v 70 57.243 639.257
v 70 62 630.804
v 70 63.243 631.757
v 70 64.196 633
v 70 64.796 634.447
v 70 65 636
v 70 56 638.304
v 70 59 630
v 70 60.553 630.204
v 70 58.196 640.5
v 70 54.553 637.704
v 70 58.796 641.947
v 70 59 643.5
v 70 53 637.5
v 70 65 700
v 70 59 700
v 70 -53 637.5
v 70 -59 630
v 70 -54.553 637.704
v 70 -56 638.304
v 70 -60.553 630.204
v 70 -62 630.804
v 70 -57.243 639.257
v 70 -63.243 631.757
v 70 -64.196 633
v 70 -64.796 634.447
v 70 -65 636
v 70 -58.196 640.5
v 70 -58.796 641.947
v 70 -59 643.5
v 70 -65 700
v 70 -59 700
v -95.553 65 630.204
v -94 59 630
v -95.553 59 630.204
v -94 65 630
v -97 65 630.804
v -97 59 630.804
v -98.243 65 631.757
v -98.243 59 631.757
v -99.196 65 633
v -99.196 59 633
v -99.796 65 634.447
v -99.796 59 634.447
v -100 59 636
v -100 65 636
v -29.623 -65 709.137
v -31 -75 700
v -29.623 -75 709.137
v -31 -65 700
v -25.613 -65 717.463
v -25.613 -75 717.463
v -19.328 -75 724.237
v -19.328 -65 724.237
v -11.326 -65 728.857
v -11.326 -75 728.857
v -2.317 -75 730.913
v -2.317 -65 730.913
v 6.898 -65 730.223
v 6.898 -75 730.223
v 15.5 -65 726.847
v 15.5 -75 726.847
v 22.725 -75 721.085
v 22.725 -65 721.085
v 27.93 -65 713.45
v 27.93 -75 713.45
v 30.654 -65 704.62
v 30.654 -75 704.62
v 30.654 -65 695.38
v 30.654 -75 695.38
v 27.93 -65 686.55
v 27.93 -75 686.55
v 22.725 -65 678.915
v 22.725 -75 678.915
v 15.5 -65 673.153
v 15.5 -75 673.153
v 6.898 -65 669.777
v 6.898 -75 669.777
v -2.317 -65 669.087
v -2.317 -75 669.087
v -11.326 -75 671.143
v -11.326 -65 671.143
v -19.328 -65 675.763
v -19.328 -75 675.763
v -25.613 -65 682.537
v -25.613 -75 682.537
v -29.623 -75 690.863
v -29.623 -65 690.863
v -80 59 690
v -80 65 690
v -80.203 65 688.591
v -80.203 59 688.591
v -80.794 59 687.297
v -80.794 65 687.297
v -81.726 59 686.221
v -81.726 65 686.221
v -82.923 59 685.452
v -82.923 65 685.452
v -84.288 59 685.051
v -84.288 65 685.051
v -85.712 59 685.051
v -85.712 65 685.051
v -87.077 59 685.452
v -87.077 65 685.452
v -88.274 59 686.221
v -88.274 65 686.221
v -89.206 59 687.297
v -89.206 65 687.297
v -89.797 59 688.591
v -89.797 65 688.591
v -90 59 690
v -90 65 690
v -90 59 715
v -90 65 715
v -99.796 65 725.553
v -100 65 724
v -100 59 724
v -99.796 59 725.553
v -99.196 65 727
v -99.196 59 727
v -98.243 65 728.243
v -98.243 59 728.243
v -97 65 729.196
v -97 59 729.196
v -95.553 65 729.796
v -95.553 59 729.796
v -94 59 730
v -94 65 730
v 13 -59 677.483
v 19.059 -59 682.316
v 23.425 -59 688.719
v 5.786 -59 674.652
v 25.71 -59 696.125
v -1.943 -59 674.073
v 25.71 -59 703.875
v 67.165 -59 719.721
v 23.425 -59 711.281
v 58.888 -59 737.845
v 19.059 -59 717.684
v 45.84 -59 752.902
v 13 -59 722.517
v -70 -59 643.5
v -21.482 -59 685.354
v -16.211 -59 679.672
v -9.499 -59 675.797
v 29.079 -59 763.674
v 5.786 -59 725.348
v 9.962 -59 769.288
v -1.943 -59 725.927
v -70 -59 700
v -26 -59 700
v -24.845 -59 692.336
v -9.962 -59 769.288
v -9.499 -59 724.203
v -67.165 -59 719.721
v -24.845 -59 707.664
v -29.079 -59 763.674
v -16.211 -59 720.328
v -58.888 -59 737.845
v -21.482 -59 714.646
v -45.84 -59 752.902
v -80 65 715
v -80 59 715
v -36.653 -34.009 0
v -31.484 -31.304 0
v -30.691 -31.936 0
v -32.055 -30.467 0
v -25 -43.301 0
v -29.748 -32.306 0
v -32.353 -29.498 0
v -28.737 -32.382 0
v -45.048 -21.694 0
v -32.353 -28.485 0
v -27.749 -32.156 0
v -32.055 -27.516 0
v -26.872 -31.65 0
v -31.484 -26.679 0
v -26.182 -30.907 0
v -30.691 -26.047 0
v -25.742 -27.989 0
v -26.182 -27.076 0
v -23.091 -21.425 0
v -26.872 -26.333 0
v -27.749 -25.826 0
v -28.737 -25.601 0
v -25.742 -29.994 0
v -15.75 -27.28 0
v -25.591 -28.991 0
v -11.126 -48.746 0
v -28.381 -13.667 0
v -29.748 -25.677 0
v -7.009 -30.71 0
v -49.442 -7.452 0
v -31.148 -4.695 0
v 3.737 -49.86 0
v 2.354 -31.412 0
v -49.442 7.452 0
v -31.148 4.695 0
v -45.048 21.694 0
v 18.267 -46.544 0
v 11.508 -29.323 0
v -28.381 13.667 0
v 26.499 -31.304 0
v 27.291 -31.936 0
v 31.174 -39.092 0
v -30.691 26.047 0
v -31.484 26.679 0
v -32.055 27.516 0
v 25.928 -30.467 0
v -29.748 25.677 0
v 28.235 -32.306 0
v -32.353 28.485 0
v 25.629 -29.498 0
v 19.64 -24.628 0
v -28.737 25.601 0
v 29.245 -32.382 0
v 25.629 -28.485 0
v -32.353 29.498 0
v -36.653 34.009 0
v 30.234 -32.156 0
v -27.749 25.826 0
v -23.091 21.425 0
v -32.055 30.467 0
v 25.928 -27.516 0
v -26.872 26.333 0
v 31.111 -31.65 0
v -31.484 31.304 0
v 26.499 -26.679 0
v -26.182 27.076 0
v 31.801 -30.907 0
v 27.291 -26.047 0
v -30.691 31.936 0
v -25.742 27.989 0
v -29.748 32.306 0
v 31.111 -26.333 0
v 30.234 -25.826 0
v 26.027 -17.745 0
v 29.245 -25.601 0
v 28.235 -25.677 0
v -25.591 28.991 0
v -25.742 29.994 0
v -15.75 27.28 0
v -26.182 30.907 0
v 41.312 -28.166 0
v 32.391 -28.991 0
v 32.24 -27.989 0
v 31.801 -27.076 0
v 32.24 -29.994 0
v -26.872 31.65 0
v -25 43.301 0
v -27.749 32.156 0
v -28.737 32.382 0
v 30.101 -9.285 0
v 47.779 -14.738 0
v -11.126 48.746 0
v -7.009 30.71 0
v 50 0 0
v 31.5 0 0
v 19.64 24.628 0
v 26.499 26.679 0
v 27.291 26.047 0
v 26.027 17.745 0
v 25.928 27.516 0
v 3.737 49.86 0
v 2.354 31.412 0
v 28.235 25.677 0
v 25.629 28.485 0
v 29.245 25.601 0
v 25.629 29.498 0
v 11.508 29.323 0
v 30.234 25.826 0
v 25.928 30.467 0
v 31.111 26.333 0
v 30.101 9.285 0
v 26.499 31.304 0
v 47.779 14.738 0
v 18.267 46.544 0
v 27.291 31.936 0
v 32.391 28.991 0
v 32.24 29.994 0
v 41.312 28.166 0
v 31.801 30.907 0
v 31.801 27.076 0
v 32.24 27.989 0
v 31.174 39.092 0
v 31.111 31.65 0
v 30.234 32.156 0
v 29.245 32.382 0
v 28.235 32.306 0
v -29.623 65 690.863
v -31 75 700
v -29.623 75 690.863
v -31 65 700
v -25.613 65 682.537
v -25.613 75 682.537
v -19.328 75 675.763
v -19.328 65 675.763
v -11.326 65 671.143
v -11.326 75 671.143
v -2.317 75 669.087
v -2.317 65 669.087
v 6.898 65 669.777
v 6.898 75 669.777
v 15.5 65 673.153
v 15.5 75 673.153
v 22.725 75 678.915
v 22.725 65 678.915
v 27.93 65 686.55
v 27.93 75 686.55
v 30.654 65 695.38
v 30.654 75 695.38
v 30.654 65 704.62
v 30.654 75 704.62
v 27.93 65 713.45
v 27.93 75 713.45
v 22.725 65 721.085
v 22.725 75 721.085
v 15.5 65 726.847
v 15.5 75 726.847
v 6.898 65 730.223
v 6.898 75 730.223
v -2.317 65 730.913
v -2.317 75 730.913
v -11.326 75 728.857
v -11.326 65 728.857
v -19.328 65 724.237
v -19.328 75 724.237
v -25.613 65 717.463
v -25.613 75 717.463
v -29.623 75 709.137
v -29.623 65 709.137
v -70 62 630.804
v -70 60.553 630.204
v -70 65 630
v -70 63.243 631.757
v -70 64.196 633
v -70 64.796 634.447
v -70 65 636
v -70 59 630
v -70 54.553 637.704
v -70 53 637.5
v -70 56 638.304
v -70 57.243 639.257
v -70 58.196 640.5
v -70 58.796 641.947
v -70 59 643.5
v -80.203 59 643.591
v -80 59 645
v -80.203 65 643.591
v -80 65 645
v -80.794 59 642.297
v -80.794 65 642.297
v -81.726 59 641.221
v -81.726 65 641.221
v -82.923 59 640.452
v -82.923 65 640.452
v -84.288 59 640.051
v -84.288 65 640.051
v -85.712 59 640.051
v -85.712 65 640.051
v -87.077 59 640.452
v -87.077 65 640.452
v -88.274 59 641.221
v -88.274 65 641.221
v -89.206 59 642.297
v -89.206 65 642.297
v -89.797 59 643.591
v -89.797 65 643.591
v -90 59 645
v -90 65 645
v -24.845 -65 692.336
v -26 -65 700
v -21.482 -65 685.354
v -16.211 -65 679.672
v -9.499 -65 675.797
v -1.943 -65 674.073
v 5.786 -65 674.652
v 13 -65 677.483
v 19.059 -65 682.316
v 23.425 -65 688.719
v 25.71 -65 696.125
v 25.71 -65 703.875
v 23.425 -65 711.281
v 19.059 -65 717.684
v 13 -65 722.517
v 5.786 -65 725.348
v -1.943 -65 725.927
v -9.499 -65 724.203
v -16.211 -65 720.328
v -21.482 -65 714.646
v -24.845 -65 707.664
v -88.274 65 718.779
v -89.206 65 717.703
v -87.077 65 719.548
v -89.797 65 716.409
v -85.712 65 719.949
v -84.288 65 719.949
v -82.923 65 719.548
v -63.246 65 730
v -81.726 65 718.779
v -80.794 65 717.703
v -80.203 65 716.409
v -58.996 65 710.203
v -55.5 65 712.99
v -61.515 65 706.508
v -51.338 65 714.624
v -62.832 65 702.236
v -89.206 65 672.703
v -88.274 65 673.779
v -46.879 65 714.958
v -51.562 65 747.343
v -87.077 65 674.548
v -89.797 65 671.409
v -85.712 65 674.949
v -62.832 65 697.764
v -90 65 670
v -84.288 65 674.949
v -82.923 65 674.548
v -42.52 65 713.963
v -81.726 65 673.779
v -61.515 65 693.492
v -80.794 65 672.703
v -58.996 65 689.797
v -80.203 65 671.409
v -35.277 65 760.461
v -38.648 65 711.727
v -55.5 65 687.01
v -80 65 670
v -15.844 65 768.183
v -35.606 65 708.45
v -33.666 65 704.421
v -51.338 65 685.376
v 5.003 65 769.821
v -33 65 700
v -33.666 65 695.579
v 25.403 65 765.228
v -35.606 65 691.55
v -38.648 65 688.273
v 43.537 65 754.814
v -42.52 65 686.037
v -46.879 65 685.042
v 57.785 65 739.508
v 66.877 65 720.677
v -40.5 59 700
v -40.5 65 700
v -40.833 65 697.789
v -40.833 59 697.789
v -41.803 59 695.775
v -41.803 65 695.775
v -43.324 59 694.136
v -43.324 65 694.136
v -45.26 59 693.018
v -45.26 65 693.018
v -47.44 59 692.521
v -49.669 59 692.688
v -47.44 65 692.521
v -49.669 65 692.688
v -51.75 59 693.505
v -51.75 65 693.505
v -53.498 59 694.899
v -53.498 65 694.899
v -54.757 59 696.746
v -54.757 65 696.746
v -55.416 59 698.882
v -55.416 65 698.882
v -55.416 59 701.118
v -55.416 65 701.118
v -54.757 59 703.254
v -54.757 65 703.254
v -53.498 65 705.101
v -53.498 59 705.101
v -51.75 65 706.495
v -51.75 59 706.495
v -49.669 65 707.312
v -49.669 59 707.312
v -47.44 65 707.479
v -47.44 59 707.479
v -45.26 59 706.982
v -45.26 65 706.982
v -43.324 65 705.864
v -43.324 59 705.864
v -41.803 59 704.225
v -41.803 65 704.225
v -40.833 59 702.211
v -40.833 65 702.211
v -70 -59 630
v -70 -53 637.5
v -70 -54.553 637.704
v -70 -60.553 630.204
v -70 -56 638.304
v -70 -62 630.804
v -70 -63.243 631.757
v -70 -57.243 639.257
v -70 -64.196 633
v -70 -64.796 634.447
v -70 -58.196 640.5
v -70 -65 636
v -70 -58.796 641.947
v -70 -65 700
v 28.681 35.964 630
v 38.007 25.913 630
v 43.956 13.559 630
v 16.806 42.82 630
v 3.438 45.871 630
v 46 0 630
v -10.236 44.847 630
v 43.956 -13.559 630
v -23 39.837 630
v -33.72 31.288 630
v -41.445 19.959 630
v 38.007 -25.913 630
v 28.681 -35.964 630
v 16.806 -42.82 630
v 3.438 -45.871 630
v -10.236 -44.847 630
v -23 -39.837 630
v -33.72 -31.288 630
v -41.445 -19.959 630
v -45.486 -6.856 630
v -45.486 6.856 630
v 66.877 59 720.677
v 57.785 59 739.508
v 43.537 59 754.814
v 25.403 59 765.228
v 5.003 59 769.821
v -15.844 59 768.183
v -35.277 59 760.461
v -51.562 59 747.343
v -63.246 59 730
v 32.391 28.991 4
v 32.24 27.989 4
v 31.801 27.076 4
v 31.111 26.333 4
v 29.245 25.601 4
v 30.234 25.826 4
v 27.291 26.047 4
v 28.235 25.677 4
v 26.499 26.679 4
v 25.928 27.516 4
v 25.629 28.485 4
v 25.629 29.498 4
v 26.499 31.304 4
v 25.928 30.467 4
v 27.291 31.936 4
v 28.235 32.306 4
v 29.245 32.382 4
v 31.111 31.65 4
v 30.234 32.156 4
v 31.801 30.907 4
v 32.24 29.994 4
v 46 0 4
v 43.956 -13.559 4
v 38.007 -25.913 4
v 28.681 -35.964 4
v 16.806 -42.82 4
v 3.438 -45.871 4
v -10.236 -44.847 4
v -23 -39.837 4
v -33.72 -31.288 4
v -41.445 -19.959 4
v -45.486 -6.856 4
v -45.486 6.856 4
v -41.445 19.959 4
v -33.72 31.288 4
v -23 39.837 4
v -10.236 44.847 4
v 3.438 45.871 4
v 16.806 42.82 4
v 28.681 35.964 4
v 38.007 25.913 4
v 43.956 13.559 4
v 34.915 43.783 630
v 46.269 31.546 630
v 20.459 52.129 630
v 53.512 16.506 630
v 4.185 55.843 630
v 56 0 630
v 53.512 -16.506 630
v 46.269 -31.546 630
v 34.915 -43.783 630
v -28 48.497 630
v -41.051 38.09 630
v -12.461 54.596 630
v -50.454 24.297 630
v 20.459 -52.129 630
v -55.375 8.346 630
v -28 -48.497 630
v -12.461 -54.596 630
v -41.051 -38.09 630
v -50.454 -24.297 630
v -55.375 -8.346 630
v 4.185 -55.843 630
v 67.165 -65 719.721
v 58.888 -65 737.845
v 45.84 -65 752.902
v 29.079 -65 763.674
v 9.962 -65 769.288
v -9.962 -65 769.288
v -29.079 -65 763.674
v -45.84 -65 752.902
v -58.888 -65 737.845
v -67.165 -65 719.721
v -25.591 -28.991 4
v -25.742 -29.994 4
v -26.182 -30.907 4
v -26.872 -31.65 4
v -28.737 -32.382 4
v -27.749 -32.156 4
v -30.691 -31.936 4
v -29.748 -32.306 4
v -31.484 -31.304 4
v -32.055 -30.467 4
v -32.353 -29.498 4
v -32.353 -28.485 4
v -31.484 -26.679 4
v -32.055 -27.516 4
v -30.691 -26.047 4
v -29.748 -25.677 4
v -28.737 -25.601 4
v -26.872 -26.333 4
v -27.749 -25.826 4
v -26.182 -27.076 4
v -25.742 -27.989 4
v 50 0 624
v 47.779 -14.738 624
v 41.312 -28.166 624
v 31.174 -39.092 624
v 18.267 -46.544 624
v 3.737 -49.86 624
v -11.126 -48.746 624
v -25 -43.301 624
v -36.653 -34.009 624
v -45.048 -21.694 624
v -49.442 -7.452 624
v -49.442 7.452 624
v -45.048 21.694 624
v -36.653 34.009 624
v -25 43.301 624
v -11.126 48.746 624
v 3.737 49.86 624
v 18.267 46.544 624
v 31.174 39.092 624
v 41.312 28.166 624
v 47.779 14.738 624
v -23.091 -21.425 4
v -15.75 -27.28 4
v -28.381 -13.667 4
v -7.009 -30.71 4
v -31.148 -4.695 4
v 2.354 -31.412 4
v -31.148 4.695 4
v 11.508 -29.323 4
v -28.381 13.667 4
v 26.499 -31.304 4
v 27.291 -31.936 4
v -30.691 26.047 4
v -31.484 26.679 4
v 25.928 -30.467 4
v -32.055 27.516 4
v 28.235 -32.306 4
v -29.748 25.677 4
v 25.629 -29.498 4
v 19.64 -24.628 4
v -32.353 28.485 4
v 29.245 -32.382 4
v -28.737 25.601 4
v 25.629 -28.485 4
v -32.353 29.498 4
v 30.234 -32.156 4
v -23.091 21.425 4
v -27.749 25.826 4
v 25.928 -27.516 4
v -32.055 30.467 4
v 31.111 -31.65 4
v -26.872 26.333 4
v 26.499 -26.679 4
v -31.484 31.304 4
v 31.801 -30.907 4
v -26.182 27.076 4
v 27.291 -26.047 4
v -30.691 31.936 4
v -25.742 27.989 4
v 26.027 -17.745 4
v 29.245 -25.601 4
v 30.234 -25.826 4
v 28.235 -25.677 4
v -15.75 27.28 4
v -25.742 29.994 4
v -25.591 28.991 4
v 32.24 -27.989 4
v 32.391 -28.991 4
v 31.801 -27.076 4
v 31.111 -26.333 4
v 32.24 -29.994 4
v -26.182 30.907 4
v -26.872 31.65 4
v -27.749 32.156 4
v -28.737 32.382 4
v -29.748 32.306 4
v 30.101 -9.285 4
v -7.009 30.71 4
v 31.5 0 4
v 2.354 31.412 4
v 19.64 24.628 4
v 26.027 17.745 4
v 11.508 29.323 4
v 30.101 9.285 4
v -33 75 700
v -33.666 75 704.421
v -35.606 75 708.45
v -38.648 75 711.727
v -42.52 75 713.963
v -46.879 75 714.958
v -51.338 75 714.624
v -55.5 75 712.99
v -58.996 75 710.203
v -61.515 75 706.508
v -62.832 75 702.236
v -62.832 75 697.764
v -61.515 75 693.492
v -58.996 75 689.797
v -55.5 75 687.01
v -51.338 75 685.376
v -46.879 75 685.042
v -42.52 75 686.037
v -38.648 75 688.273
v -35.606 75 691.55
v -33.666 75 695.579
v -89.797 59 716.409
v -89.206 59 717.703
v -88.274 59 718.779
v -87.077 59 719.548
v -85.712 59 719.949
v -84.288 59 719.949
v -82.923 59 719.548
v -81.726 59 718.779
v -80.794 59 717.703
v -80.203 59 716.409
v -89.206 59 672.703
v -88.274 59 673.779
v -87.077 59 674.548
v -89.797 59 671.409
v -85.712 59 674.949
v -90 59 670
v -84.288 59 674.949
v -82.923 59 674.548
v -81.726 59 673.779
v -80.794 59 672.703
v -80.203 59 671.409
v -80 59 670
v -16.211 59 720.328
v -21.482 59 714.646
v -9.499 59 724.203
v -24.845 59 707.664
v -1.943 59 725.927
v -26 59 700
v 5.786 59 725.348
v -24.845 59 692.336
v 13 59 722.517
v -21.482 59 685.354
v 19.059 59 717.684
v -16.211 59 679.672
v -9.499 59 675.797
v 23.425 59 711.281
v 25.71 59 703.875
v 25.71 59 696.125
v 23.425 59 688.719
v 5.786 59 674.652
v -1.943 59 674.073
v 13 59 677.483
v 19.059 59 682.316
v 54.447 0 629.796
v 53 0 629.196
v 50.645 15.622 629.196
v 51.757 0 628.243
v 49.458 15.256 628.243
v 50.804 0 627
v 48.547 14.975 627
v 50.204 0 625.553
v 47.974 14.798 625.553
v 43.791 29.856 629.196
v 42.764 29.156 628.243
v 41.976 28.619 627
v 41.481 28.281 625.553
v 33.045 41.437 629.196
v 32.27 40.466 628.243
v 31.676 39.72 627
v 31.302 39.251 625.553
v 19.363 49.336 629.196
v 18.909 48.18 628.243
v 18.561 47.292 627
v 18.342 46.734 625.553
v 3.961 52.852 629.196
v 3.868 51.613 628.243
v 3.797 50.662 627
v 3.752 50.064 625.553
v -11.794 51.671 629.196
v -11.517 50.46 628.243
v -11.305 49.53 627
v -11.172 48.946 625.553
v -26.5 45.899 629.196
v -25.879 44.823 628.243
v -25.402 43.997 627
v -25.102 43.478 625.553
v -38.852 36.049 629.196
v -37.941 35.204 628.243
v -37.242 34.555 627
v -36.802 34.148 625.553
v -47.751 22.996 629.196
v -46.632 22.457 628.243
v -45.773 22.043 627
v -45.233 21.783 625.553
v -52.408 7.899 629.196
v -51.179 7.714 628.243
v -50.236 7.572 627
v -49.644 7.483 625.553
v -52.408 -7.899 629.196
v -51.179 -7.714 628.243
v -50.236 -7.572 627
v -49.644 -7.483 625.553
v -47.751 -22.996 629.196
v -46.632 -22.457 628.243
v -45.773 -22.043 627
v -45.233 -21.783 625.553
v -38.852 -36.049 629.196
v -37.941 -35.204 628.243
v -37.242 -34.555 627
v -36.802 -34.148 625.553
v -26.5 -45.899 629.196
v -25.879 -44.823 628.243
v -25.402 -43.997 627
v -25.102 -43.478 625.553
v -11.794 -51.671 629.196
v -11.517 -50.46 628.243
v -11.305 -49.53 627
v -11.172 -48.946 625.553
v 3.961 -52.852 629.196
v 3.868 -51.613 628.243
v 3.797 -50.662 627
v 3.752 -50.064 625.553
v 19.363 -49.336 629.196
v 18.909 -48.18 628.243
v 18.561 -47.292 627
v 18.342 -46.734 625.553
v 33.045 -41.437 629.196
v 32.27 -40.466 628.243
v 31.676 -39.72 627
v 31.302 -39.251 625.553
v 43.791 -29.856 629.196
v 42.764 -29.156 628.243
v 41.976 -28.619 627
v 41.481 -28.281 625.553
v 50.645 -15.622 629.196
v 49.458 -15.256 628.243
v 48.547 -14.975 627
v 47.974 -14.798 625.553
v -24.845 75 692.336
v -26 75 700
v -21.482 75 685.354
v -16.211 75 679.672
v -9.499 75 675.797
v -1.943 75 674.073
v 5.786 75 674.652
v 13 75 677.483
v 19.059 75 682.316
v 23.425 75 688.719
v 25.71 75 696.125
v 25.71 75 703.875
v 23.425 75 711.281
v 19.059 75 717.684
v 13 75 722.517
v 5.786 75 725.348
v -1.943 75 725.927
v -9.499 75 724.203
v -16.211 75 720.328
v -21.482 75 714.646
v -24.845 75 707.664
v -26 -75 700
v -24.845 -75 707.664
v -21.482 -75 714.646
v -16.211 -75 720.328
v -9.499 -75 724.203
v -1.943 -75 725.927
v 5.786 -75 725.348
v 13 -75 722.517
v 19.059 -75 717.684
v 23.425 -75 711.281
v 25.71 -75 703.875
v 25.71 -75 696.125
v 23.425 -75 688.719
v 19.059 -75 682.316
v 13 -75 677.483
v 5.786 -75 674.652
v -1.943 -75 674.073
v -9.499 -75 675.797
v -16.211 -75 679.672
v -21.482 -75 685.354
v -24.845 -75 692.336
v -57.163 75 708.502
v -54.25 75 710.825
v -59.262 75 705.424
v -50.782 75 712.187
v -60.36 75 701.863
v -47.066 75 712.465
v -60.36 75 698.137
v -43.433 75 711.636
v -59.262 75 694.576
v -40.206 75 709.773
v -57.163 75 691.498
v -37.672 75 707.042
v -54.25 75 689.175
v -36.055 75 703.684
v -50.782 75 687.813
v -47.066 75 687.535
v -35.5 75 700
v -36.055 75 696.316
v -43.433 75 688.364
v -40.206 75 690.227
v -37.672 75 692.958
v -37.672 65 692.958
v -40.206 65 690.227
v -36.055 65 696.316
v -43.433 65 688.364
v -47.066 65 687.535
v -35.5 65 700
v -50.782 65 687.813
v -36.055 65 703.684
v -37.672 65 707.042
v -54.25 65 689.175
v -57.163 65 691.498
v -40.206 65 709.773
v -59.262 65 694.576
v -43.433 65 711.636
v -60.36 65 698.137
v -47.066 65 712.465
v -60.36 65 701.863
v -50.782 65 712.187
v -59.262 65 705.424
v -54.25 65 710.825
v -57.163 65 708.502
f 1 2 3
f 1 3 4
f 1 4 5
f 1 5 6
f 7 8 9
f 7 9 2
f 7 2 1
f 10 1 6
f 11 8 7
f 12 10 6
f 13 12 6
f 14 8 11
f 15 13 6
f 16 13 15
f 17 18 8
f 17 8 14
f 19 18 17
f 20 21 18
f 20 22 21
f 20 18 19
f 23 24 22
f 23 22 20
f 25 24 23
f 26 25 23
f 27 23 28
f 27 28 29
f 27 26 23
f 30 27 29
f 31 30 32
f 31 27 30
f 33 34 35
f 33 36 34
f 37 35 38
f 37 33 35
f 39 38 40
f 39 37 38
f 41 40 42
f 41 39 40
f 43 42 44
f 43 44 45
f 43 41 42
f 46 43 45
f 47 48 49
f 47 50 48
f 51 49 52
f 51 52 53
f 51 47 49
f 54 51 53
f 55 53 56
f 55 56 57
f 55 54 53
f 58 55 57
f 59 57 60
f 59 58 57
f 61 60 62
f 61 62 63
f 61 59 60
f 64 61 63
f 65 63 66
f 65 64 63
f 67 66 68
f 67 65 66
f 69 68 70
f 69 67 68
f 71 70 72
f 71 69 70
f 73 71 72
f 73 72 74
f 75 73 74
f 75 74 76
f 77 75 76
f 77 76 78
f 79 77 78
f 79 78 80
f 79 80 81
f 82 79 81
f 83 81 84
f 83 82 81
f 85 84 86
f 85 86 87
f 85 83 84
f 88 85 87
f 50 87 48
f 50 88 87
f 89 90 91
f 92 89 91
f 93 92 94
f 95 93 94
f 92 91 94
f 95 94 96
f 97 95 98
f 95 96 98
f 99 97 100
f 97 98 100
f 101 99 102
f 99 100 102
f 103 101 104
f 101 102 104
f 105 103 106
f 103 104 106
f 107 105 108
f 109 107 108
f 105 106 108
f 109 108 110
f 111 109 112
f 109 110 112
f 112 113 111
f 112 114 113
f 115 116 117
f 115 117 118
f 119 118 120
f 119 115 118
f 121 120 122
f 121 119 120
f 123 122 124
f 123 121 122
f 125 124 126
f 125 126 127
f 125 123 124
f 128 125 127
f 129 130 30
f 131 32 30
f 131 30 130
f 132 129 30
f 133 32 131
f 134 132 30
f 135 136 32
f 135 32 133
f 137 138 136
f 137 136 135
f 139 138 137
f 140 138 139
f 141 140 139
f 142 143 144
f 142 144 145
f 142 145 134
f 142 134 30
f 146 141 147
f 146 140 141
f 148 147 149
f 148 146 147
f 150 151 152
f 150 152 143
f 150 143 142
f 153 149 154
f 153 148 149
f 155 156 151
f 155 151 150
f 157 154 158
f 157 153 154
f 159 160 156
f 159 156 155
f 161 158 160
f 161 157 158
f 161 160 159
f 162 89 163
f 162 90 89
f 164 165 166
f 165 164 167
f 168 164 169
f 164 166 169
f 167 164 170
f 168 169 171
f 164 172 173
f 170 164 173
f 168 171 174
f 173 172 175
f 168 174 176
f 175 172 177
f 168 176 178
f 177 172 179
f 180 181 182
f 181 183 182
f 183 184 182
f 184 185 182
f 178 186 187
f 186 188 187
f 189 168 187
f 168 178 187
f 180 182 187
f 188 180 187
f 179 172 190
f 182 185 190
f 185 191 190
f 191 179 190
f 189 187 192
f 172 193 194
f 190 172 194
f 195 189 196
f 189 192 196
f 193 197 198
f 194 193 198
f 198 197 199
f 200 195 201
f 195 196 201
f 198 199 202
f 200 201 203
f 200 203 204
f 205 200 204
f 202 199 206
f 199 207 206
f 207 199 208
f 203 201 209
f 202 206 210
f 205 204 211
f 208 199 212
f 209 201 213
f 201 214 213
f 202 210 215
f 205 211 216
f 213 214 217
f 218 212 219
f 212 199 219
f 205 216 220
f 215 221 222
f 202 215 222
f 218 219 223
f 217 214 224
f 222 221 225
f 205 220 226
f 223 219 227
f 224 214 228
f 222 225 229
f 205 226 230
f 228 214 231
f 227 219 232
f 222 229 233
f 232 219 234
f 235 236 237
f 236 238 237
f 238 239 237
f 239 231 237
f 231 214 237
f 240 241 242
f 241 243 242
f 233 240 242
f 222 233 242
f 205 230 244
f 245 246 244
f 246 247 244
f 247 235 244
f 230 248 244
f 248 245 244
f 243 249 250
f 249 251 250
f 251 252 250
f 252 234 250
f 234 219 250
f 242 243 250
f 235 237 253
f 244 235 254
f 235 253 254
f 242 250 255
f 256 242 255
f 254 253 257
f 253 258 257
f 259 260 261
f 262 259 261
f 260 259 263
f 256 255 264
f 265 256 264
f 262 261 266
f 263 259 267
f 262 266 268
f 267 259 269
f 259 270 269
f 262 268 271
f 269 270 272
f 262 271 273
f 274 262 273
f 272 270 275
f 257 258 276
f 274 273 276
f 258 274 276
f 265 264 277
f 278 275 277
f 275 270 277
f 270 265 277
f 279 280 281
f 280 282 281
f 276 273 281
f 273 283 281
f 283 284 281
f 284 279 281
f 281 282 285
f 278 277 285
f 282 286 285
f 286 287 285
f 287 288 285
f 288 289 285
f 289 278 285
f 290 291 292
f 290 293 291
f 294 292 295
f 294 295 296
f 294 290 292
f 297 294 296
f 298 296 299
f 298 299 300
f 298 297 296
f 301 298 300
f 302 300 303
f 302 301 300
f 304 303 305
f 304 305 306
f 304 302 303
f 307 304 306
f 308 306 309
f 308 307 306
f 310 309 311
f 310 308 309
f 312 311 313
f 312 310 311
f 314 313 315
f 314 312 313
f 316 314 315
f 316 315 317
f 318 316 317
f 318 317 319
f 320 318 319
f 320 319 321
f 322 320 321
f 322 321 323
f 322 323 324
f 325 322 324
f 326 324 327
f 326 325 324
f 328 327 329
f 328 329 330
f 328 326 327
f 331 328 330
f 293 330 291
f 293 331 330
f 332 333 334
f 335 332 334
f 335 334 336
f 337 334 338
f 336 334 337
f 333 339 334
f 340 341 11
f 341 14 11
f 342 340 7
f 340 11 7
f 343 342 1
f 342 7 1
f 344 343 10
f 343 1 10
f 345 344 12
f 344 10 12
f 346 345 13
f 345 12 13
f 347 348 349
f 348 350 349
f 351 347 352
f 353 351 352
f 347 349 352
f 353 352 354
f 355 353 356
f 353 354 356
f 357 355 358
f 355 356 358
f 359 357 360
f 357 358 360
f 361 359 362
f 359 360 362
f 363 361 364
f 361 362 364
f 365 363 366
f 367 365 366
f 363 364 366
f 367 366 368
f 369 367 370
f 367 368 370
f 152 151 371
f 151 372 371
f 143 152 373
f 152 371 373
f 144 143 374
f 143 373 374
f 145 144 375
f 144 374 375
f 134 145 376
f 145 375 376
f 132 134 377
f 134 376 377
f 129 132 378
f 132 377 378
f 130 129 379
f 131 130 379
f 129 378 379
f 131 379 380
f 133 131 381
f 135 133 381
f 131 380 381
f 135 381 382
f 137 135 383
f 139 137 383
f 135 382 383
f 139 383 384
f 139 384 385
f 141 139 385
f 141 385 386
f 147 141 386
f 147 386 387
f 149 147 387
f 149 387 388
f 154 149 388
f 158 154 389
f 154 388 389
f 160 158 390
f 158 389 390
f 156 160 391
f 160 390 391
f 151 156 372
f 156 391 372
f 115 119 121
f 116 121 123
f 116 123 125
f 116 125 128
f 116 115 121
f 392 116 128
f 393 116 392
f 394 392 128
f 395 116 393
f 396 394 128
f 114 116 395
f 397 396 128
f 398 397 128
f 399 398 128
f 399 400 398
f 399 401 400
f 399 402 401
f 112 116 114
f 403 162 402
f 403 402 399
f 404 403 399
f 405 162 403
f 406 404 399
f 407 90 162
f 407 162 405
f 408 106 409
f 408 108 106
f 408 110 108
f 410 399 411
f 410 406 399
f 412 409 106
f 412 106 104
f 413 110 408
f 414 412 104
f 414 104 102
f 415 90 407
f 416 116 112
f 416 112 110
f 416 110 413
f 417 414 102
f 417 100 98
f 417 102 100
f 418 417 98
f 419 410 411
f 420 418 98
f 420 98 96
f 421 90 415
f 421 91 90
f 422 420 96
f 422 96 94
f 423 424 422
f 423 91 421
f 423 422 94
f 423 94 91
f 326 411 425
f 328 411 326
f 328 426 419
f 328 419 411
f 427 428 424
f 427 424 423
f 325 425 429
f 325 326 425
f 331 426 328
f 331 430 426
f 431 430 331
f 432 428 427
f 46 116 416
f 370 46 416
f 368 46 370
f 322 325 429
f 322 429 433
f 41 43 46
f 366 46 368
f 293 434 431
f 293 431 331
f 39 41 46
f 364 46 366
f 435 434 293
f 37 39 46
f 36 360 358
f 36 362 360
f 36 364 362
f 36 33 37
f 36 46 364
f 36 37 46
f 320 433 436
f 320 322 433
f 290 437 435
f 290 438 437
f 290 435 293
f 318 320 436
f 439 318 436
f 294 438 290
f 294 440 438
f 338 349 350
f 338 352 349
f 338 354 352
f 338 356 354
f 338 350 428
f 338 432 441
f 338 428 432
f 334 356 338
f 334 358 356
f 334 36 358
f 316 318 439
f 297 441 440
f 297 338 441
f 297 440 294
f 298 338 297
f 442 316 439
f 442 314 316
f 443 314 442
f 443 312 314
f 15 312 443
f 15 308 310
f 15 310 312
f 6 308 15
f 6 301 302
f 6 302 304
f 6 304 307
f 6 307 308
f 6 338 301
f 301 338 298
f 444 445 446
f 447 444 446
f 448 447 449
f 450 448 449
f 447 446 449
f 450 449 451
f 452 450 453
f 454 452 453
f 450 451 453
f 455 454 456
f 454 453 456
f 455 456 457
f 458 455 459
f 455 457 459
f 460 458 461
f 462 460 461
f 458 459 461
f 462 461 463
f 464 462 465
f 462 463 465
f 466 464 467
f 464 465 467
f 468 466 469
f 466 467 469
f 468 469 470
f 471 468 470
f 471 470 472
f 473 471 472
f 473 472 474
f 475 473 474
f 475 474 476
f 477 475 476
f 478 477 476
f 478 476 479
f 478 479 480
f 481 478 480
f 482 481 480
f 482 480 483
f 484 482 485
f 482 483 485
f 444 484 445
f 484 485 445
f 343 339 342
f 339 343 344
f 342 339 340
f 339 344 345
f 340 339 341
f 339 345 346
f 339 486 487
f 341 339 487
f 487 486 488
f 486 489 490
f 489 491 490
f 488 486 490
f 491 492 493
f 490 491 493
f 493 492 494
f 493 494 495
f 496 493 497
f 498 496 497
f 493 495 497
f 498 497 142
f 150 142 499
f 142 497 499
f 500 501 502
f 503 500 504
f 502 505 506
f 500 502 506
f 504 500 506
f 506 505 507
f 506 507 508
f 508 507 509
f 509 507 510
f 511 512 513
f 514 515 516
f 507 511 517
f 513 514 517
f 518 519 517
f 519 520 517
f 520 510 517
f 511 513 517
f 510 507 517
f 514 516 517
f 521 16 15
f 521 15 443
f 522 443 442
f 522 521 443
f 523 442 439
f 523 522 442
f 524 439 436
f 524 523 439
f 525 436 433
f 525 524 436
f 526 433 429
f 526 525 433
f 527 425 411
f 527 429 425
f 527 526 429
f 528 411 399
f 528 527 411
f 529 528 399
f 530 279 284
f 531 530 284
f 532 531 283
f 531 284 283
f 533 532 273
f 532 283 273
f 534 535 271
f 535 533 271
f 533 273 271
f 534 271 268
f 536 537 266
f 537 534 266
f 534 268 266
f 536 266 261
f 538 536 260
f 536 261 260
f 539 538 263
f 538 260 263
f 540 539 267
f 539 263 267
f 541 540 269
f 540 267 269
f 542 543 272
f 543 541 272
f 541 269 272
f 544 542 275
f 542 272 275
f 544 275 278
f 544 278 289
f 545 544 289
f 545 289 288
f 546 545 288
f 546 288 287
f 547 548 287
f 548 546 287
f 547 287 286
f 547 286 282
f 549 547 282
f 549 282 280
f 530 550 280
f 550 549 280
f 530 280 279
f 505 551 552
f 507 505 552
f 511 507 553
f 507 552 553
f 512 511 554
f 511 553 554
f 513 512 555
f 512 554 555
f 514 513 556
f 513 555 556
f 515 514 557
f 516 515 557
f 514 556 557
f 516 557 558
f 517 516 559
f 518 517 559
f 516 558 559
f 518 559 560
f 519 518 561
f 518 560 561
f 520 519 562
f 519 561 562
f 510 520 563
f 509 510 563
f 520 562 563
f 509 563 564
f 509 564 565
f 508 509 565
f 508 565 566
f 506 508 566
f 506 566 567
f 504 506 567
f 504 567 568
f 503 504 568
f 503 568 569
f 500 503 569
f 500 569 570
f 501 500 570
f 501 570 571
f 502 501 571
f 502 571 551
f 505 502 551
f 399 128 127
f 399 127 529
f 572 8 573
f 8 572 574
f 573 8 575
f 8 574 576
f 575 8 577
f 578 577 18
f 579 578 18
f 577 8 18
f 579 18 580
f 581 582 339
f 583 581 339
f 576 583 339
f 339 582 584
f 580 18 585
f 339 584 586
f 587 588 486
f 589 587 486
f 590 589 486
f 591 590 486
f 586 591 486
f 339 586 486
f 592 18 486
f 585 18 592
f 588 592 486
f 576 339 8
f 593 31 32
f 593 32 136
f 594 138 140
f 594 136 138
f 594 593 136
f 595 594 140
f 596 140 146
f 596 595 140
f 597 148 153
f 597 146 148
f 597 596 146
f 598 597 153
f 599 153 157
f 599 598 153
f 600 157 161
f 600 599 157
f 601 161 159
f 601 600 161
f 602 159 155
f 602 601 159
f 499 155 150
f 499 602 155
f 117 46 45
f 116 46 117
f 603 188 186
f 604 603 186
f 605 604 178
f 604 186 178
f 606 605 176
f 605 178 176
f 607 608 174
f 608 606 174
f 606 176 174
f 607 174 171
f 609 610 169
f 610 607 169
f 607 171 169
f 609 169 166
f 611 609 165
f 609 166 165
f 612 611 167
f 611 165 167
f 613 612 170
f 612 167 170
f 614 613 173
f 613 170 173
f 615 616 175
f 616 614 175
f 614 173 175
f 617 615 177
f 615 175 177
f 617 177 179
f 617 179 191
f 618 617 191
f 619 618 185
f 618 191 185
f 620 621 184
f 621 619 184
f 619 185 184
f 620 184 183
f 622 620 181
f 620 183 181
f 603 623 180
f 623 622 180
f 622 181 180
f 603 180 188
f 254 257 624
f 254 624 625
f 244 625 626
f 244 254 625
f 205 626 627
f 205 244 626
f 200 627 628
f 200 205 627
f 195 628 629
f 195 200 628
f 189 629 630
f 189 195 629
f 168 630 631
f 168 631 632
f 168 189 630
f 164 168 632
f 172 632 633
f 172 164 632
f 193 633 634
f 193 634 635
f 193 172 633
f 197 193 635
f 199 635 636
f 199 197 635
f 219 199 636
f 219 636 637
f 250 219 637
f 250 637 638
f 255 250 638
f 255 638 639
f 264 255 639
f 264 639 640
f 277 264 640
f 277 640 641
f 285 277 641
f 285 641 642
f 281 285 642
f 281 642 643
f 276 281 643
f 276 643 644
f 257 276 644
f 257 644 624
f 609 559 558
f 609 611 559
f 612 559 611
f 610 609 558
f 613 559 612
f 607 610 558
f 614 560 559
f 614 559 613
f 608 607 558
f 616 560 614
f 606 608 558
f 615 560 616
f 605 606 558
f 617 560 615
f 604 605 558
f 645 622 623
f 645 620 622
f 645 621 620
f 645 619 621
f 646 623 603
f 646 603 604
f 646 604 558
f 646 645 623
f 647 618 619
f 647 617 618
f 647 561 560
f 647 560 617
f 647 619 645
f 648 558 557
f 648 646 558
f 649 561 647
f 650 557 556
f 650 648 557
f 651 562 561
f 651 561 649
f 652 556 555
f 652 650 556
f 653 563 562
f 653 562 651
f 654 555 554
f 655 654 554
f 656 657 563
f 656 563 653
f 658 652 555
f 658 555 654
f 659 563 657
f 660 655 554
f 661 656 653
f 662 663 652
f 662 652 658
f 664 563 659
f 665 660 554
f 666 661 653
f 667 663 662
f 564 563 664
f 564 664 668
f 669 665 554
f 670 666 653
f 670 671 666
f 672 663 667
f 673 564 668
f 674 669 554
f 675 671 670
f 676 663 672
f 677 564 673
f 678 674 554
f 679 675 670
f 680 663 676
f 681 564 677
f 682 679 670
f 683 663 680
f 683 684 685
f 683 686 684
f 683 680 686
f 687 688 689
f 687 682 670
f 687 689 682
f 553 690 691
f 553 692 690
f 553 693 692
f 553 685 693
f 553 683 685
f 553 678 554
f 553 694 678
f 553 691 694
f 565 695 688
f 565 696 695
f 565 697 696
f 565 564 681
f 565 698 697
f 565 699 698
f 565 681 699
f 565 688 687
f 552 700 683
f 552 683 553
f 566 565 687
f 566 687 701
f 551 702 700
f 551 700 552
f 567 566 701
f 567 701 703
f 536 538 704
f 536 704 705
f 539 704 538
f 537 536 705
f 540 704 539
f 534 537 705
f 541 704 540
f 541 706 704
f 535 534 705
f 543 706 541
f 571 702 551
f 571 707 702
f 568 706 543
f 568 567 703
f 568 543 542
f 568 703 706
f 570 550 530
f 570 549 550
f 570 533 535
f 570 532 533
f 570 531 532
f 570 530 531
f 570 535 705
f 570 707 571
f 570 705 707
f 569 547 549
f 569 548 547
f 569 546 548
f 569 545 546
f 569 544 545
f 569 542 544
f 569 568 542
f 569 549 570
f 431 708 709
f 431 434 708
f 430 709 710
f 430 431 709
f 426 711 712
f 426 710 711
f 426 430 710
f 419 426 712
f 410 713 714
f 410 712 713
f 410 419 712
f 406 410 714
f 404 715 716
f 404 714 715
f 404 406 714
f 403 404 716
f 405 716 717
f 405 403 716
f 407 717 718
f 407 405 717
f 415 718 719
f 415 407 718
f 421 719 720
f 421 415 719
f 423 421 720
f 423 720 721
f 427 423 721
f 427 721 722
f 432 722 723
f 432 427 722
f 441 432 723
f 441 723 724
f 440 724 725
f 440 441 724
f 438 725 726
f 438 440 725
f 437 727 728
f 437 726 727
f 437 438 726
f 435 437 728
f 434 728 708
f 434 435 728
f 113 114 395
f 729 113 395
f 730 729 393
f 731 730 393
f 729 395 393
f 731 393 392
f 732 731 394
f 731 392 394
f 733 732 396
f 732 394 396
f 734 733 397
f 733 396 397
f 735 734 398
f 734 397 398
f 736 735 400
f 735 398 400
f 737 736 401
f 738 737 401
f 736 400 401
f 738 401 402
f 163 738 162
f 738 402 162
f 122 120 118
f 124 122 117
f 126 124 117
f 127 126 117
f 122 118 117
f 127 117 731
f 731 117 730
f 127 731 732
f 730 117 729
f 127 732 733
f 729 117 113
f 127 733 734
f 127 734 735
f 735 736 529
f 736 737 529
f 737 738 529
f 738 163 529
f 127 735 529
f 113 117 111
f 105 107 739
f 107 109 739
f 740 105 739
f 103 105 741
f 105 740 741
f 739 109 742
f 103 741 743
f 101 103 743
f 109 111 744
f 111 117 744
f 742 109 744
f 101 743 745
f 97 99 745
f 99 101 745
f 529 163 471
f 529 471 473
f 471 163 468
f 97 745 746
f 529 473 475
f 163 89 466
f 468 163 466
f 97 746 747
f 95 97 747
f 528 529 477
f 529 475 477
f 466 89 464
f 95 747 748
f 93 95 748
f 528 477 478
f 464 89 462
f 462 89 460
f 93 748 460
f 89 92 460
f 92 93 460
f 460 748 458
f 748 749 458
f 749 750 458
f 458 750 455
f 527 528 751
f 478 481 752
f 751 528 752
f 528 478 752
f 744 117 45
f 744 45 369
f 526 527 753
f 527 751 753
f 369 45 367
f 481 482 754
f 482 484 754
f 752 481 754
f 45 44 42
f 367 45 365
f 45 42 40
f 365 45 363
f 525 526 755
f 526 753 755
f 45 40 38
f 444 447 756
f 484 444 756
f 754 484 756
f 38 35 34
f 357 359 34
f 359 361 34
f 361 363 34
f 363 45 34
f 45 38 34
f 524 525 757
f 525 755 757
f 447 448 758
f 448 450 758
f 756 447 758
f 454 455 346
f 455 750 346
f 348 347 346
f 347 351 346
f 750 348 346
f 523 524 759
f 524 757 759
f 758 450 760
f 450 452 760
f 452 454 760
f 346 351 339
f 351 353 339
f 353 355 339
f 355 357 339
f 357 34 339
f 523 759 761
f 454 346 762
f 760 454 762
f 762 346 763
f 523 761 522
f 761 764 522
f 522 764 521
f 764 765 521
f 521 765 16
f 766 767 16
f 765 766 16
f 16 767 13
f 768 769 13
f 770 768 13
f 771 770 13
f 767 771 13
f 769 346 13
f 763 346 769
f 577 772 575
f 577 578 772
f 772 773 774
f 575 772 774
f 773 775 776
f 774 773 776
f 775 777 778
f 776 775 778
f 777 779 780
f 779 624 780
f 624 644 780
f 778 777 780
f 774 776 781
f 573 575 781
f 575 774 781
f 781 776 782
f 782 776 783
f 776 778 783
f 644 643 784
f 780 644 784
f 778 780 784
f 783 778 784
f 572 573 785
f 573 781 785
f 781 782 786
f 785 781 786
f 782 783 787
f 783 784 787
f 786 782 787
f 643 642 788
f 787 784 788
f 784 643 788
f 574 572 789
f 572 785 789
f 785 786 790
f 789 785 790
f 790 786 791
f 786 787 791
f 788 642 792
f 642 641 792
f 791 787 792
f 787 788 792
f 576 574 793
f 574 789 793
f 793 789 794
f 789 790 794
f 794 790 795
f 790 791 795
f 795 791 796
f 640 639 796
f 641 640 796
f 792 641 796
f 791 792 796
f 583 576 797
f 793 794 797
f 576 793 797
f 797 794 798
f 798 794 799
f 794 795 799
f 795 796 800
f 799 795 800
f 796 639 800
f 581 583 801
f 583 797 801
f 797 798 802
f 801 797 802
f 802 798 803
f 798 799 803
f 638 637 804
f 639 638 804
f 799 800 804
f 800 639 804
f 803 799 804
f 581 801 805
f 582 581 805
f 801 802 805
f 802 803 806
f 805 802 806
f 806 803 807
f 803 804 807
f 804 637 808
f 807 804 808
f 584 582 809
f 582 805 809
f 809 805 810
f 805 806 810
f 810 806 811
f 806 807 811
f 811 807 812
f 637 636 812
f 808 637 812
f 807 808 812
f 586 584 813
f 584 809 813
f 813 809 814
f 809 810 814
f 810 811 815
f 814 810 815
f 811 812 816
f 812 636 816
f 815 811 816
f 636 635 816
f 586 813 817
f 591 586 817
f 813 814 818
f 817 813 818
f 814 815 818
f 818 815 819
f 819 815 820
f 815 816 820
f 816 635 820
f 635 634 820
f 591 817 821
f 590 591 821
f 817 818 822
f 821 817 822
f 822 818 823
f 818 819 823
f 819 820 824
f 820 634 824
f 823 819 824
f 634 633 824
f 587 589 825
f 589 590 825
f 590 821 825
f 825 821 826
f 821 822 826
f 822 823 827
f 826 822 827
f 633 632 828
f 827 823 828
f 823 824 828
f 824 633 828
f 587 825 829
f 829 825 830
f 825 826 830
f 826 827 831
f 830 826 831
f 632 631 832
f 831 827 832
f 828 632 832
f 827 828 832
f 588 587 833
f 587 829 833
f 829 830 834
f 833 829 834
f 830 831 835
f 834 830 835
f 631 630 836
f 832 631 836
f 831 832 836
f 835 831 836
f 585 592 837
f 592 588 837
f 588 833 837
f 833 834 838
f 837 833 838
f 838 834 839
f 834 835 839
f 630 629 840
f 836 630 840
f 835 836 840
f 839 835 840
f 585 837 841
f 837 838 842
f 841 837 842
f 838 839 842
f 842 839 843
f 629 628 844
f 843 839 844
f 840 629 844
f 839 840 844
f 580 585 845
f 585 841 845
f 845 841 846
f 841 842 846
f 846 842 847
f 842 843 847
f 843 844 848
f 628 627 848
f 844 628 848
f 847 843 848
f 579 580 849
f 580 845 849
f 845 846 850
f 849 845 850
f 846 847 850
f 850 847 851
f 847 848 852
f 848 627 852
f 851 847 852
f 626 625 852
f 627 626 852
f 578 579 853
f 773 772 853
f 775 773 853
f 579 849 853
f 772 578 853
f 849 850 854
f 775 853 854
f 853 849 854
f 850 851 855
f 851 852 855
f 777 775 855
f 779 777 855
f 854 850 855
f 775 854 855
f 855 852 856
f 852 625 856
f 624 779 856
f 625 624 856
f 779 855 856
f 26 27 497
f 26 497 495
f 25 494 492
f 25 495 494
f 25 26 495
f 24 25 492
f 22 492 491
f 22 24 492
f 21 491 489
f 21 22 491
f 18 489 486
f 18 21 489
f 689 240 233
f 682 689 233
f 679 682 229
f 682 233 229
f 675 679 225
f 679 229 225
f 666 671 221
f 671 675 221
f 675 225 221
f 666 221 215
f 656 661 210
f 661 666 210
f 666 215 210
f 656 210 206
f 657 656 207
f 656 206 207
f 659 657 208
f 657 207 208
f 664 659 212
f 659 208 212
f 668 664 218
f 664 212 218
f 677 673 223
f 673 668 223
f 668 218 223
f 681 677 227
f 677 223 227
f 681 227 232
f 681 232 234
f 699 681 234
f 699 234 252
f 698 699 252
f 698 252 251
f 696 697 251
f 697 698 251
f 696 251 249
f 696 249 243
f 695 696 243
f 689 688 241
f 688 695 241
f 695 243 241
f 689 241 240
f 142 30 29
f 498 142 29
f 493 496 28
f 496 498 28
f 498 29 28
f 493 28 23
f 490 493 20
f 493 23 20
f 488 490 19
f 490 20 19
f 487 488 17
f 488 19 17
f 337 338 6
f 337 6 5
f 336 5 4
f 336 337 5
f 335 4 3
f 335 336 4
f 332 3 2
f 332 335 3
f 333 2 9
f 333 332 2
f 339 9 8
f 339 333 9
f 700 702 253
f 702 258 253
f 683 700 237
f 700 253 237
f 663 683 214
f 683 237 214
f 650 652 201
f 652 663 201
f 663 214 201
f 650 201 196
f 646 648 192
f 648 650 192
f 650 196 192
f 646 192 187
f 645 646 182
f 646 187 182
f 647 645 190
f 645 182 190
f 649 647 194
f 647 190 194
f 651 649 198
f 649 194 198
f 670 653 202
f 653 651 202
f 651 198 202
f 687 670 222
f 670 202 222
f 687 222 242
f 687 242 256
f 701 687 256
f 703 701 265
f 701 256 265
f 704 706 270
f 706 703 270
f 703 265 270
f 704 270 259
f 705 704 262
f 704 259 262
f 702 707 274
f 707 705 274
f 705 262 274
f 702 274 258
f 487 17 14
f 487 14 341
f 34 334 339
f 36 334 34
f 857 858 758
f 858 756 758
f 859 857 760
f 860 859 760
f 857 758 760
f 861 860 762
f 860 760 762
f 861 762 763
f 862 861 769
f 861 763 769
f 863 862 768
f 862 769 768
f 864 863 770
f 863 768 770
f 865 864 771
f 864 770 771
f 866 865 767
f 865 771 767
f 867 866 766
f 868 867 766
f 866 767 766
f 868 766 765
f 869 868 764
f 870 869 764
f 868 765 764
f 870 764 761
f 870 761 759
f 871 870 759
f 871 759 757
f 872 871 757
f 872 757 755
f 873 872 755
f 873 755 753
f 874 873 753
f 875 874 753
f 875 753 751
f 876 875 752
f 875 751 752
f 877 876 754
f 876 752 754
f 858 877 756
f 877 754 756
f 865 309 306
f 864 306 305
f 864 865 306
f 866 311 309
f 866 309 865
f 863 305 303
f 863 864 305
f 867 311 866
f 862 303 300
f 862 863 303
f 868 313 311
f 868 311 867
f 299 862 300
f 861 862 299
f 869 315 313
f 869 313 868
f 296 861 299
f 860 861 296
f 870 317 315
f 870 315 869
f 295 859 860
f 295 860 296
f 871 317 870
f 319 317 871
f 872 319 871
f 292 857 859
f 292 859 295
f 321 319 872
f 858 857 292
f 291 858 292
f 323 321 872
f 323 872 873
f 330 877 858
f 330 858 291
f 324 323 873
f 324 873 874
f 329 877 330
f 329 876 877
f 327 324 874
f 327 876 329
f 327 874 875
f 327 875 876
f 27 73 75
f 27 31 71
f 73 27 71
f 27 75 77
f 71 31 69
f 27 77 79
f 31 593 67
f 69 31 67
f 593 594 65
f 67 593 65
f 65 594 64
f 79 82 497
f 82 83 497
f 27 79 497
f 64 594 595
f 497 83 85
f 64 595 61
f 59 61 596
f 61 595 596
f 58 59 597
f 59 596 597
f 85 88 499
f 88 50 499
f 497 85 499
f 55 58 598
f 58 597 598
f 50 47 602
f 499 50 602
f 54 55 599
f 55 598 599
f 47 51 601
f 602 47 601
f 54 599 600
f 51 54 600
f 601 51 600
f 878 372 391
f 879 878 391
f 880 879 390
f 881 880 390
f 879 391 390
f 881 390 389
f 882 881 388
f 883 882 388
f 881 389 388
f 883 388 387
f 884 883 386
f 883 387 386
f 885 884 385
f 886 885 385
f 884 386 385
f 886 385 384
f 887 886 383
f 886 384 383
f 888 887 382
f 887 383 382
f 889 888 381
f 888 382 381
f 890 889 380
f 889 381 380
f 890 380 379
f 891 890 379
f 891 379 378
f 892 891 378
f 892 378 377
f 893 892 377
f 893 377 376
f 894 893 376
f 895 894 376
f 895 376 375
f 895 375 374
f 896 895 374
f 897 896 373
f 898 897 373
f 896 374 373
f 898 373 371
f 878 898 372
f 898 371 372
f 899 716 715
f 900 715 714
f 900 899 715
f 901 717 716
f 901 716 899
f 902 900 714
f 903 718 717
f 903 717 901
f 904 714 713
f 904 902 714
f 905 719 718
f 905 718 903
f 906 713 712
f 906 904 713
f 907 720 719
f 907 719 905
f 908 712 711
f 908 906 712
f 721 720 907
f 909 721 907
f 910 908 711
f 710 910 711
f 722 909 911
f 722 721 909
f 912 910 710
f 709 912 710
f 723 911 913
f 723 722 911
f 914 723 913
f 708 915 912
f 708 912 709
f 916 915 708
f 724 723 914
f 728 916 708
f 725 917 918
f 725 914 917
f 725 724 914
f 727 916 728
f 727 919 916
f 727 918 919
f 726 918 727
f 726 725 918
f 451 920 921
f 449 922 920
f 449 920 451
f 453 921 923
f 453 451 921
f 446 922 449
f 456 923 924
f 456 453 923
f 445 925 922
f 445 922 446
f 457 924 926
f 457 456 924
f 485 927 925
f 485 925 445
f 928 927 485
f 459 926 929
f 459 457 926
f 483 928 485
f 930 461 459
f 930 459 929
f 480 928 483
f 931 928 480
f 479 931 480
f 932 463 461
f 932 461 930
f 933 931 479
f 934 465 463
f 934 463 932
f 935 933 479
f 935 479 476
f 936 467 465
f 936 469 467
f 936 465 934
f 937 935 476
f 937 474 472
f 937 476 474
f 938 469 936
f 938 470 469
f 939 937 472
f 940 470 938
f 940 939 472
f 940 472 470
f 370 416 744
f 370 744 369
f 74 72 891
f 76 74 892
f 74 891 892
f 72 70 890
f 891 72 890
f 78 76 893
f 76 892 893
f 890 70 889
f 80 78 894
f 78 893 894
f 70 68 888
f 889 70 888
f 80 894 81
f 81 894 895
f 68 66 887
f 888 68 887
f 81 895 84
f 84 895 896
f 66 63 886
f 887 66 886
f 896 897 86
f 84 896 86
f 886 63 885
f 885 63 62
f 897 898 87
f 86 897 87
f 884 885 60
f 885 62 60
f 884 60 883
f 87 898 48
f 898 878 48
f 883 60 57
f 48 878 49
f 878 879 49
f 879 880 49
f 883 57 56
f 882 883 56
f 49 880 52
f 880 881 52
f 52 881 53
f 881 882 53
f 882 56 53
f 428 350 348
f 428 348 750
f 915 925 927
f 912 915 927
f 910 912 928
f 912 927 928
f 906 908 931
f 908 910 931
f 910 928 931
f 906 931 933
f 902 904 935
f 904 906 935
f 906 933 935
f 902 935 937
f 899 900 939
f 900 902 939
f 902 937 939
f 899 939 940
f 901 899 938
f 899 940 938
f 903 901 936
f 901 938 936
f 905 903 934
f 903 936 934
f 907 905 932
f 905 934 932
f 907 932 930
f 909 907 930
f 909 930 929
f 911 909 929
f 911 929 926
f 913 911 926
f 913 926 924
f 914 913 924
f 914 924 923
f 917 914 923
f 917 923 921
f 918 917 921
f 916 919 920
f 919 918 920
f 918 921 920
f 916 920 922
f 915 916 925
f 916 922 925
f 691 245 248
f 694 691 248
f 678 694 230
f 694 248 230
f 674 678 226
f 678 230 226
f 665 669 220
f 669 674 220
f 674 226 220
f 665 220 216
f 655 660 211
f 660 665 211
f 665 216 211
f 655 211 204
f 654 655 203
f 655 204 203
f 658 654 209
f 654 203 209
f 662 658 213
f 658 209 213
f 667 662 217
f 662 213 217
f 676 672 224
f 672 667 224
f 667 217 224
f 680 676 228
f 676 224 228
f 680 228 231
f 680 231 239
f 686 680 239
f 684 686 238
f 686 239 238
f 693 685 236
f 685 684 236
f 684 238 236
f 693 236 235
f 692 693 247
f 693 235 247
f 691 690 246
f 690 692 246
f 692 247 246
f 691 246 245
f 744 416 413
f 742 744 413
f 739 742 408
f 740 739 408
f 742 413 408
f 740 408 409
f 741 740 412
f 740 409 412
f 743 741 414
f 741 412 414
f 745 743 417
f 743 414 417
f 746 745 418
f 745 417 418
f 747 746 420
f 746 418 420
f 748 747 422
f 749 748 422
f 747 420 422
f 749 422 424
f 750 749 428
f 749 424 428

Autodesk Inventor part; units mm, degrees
ref_plane "YZ Plane" through (0, 0, 0) normal (1, 0, 0) x (0, 1, 0)
ref_plane "XZ Plane" through (0, 0, 0) normal (0, 1, 0) x (-1, 0, 0)
ref_plane "XY Plane" through (0, 0, 0) normal (0, 0, 1) x (1, 0, 0)
sketch "Szkic1" plane through (0, 0, 0) normal (0, 0, 1) x (1, 0, 0)
  circle A0 centre (0, 0) radius 50
  circle A1 centre (0, 0) radius 46
  circle A2 centre (0, 0) radius 31.5
  circle A3 centre (-28.9914, 28.9914) radius 3.4
  circle A4 centre (-28.9914, -28.9914) radius 3.4
  circle A5 centre (28.9914, 28.9914) radius 3.4
  circle A6 centre (28.9914, -28.9914) radius 3.4
  dimension "d0" = 100
  dimension "d1" = 92
  dimension "d2" = 63
  dimension "d4" = 6.8
  dimension "d5" = 6.8
  dimension "d6" = 6.8
  dimension "d7" = 6.8
extrude "Wyciągnięcie proste1" add sketch "Szkic1" along normal blind 4 contours A1
extrude "Wyciągnięcie proste2" add sketch "Szkic1" along normal blind 700 contours A0
sketch "Szkic5" plane through (0, 0, 0) normal (0, 1, 0) x (-1, 0, 0)
  line L0 (50, 700) -> (-50, 700) projected
  arc A0 (70, 700) -> (-70, 700) centre (0, 700) ccw
  circle A1 centre (0, 700) radius 26
  circle A2 centre (0, 700) radius 31
  line L1 (0, 630) -> (70, 630)
  line L2 (70, 630) -> (70, 700)
  line L3 (0, 630) -> (-70, 630)
  line L4 (-70, 630) -> (-70, 700)
  line L5 (0, 637.5) -> (70, 637.5)
  line L6 (0, 637.5) -> (-70, 637.5)
  point P0 (0, 0)
  point P1 (26, 700)
  point P2 (-26, 700)
  dimension "d28" = 140
  dimension "d29" = 52
  dimension "d35" = 62
extrude "Wyciągnięcie proste7" add sketch "Szkic5" along normal mid plane 130 contours A2 L0 A1 | L0 A1 A2 | A1 L0 | L0 A1 | L2 L5 L6 L4 A0 | L2 L1 L3 L4 L6 L5
extrude "Wyciągnięcie proste8" cut sketch "Szkic5" along normal mid plane 130 contours A1 L0 | L0 A1
extrude "Wyciągnięcie proste9" add sketch "Szkic5" along normal mid plane 150 contours A2 L0 A1 | L0 A1 A2
extrude "Wyciągnięcie proste10" cut sketch "Szkic5" along normal mid plane 118 contours A2 L0 A1 | L0 A1 A2 | A1 L0 | L0 A1 | L2 L5 L6 L4 A0 | L2 L1 L3 L4 L6 L5
sketch "Szkic7" plane through (0, 65, 700) normal (0, 1, 0) x (1, 0, 0)
  circle A0 centre (-48, 0) radius 7.5
  circle A1 centre (-48, 0) radius 12.5
  circle A2 centre (-48, 0) radius 15
  line L0 (-70, 70) -> (-70, 0) projected
  line L1 (-70, 70) -> (-94, 70)
  line L2 (-100, 64) -> (-100, -24)
  arc A3 (-70, 0) -> (70, 0) centre (0, 0) ccw projected
  line L3 (-94, -30) -> (-63.2456, -30)
  arc A4 (-100, -24) -> (-94, -30) centre (-94, -24) ccw
  arc A5 (-94, 70) -> (-100, 64) centre (-94, 64) ccw
  arc A6 (-80, 55) -> (-90, 55) centre (-85, 55) ccw
  arc A7 (-90, -15) -> (-80, -15) centre (-85, -15) ccw
  arc A8 (-90, 30) -> (-80, 30) centre (-85, 30) ccw
  arc A9 (-80, 10) -> (-90, 10) centre (-85, 10) ccw
  line L4 (-80, 10) -> (-80, -15)
  line L5 (-90, -15) -> (-90, 10)
  line L6 (-80, 55) -> (-80, 30)
  line L7 (-90, 30) -> (-90, 55)
  point P0 (0, 700)
  point P1 (-100, 70)
  point P2 (-100, -30)
  dimension "d46" = 15
  dimension "d47" = 25
  dimension "d48" = 30
  dimension "d57" = 30
  dimension "d58" = 100
  dimension "d59" = 6
  dimension "d60" = 6
  dimension "d62" = 10
  dimension "d63" = 10
  dimension "d64" = 10
  dimension "d66" = 10
  dimension "d67" = 25
extrude "Wyciągnięcie proste13" add sketch "Szkic7" along normal blind 10 contours A2
extrude "Wyciągnięcie proste14" cut sketch "Szkic7" against normal blind 6 contours A0
extrude "Wyciągnięcie proste15" add sketch "Szkic5" along normal mid plane 130 contours L2 L1 L3 L4 L6 L5
fillet "Zaokrąglenie1" radius 6 4 edges at (0, 65, 630) (0, -65, 630) (0, 59, 637.5) (0, -59, 637.5)
fillet "Zaokrąglenie2" radius 6 1 edges at (-50, 0, 630)
extrude "Wyciągnięcie proste16" add sketch "Szkic7" against normal blind 6 contours L0 A3 L3 A4 L2 A5 L1
thread "Gwint1" size "M8x1.25" class "6H" standard "ANSI Metric M Profile" full length
thread "Gwint2" size "M7x1" class "6H" standard "ANSI Metric M Profile" full length
thread "Gwint3" size "M8x1.25" class "6H" standard "ANSI Metric M Profile" full length
thread "Gwint4" size "M8x1.25" class "6H" standard "ANSI Metric M Profile" full length
thread "Gwint5" size "M8x1.25" class "6H" standard "ANSI Metric M Profile" full length
properties part number "czlon_1" material "CFRP — polimer wzmocniony włóknem szklanym"
